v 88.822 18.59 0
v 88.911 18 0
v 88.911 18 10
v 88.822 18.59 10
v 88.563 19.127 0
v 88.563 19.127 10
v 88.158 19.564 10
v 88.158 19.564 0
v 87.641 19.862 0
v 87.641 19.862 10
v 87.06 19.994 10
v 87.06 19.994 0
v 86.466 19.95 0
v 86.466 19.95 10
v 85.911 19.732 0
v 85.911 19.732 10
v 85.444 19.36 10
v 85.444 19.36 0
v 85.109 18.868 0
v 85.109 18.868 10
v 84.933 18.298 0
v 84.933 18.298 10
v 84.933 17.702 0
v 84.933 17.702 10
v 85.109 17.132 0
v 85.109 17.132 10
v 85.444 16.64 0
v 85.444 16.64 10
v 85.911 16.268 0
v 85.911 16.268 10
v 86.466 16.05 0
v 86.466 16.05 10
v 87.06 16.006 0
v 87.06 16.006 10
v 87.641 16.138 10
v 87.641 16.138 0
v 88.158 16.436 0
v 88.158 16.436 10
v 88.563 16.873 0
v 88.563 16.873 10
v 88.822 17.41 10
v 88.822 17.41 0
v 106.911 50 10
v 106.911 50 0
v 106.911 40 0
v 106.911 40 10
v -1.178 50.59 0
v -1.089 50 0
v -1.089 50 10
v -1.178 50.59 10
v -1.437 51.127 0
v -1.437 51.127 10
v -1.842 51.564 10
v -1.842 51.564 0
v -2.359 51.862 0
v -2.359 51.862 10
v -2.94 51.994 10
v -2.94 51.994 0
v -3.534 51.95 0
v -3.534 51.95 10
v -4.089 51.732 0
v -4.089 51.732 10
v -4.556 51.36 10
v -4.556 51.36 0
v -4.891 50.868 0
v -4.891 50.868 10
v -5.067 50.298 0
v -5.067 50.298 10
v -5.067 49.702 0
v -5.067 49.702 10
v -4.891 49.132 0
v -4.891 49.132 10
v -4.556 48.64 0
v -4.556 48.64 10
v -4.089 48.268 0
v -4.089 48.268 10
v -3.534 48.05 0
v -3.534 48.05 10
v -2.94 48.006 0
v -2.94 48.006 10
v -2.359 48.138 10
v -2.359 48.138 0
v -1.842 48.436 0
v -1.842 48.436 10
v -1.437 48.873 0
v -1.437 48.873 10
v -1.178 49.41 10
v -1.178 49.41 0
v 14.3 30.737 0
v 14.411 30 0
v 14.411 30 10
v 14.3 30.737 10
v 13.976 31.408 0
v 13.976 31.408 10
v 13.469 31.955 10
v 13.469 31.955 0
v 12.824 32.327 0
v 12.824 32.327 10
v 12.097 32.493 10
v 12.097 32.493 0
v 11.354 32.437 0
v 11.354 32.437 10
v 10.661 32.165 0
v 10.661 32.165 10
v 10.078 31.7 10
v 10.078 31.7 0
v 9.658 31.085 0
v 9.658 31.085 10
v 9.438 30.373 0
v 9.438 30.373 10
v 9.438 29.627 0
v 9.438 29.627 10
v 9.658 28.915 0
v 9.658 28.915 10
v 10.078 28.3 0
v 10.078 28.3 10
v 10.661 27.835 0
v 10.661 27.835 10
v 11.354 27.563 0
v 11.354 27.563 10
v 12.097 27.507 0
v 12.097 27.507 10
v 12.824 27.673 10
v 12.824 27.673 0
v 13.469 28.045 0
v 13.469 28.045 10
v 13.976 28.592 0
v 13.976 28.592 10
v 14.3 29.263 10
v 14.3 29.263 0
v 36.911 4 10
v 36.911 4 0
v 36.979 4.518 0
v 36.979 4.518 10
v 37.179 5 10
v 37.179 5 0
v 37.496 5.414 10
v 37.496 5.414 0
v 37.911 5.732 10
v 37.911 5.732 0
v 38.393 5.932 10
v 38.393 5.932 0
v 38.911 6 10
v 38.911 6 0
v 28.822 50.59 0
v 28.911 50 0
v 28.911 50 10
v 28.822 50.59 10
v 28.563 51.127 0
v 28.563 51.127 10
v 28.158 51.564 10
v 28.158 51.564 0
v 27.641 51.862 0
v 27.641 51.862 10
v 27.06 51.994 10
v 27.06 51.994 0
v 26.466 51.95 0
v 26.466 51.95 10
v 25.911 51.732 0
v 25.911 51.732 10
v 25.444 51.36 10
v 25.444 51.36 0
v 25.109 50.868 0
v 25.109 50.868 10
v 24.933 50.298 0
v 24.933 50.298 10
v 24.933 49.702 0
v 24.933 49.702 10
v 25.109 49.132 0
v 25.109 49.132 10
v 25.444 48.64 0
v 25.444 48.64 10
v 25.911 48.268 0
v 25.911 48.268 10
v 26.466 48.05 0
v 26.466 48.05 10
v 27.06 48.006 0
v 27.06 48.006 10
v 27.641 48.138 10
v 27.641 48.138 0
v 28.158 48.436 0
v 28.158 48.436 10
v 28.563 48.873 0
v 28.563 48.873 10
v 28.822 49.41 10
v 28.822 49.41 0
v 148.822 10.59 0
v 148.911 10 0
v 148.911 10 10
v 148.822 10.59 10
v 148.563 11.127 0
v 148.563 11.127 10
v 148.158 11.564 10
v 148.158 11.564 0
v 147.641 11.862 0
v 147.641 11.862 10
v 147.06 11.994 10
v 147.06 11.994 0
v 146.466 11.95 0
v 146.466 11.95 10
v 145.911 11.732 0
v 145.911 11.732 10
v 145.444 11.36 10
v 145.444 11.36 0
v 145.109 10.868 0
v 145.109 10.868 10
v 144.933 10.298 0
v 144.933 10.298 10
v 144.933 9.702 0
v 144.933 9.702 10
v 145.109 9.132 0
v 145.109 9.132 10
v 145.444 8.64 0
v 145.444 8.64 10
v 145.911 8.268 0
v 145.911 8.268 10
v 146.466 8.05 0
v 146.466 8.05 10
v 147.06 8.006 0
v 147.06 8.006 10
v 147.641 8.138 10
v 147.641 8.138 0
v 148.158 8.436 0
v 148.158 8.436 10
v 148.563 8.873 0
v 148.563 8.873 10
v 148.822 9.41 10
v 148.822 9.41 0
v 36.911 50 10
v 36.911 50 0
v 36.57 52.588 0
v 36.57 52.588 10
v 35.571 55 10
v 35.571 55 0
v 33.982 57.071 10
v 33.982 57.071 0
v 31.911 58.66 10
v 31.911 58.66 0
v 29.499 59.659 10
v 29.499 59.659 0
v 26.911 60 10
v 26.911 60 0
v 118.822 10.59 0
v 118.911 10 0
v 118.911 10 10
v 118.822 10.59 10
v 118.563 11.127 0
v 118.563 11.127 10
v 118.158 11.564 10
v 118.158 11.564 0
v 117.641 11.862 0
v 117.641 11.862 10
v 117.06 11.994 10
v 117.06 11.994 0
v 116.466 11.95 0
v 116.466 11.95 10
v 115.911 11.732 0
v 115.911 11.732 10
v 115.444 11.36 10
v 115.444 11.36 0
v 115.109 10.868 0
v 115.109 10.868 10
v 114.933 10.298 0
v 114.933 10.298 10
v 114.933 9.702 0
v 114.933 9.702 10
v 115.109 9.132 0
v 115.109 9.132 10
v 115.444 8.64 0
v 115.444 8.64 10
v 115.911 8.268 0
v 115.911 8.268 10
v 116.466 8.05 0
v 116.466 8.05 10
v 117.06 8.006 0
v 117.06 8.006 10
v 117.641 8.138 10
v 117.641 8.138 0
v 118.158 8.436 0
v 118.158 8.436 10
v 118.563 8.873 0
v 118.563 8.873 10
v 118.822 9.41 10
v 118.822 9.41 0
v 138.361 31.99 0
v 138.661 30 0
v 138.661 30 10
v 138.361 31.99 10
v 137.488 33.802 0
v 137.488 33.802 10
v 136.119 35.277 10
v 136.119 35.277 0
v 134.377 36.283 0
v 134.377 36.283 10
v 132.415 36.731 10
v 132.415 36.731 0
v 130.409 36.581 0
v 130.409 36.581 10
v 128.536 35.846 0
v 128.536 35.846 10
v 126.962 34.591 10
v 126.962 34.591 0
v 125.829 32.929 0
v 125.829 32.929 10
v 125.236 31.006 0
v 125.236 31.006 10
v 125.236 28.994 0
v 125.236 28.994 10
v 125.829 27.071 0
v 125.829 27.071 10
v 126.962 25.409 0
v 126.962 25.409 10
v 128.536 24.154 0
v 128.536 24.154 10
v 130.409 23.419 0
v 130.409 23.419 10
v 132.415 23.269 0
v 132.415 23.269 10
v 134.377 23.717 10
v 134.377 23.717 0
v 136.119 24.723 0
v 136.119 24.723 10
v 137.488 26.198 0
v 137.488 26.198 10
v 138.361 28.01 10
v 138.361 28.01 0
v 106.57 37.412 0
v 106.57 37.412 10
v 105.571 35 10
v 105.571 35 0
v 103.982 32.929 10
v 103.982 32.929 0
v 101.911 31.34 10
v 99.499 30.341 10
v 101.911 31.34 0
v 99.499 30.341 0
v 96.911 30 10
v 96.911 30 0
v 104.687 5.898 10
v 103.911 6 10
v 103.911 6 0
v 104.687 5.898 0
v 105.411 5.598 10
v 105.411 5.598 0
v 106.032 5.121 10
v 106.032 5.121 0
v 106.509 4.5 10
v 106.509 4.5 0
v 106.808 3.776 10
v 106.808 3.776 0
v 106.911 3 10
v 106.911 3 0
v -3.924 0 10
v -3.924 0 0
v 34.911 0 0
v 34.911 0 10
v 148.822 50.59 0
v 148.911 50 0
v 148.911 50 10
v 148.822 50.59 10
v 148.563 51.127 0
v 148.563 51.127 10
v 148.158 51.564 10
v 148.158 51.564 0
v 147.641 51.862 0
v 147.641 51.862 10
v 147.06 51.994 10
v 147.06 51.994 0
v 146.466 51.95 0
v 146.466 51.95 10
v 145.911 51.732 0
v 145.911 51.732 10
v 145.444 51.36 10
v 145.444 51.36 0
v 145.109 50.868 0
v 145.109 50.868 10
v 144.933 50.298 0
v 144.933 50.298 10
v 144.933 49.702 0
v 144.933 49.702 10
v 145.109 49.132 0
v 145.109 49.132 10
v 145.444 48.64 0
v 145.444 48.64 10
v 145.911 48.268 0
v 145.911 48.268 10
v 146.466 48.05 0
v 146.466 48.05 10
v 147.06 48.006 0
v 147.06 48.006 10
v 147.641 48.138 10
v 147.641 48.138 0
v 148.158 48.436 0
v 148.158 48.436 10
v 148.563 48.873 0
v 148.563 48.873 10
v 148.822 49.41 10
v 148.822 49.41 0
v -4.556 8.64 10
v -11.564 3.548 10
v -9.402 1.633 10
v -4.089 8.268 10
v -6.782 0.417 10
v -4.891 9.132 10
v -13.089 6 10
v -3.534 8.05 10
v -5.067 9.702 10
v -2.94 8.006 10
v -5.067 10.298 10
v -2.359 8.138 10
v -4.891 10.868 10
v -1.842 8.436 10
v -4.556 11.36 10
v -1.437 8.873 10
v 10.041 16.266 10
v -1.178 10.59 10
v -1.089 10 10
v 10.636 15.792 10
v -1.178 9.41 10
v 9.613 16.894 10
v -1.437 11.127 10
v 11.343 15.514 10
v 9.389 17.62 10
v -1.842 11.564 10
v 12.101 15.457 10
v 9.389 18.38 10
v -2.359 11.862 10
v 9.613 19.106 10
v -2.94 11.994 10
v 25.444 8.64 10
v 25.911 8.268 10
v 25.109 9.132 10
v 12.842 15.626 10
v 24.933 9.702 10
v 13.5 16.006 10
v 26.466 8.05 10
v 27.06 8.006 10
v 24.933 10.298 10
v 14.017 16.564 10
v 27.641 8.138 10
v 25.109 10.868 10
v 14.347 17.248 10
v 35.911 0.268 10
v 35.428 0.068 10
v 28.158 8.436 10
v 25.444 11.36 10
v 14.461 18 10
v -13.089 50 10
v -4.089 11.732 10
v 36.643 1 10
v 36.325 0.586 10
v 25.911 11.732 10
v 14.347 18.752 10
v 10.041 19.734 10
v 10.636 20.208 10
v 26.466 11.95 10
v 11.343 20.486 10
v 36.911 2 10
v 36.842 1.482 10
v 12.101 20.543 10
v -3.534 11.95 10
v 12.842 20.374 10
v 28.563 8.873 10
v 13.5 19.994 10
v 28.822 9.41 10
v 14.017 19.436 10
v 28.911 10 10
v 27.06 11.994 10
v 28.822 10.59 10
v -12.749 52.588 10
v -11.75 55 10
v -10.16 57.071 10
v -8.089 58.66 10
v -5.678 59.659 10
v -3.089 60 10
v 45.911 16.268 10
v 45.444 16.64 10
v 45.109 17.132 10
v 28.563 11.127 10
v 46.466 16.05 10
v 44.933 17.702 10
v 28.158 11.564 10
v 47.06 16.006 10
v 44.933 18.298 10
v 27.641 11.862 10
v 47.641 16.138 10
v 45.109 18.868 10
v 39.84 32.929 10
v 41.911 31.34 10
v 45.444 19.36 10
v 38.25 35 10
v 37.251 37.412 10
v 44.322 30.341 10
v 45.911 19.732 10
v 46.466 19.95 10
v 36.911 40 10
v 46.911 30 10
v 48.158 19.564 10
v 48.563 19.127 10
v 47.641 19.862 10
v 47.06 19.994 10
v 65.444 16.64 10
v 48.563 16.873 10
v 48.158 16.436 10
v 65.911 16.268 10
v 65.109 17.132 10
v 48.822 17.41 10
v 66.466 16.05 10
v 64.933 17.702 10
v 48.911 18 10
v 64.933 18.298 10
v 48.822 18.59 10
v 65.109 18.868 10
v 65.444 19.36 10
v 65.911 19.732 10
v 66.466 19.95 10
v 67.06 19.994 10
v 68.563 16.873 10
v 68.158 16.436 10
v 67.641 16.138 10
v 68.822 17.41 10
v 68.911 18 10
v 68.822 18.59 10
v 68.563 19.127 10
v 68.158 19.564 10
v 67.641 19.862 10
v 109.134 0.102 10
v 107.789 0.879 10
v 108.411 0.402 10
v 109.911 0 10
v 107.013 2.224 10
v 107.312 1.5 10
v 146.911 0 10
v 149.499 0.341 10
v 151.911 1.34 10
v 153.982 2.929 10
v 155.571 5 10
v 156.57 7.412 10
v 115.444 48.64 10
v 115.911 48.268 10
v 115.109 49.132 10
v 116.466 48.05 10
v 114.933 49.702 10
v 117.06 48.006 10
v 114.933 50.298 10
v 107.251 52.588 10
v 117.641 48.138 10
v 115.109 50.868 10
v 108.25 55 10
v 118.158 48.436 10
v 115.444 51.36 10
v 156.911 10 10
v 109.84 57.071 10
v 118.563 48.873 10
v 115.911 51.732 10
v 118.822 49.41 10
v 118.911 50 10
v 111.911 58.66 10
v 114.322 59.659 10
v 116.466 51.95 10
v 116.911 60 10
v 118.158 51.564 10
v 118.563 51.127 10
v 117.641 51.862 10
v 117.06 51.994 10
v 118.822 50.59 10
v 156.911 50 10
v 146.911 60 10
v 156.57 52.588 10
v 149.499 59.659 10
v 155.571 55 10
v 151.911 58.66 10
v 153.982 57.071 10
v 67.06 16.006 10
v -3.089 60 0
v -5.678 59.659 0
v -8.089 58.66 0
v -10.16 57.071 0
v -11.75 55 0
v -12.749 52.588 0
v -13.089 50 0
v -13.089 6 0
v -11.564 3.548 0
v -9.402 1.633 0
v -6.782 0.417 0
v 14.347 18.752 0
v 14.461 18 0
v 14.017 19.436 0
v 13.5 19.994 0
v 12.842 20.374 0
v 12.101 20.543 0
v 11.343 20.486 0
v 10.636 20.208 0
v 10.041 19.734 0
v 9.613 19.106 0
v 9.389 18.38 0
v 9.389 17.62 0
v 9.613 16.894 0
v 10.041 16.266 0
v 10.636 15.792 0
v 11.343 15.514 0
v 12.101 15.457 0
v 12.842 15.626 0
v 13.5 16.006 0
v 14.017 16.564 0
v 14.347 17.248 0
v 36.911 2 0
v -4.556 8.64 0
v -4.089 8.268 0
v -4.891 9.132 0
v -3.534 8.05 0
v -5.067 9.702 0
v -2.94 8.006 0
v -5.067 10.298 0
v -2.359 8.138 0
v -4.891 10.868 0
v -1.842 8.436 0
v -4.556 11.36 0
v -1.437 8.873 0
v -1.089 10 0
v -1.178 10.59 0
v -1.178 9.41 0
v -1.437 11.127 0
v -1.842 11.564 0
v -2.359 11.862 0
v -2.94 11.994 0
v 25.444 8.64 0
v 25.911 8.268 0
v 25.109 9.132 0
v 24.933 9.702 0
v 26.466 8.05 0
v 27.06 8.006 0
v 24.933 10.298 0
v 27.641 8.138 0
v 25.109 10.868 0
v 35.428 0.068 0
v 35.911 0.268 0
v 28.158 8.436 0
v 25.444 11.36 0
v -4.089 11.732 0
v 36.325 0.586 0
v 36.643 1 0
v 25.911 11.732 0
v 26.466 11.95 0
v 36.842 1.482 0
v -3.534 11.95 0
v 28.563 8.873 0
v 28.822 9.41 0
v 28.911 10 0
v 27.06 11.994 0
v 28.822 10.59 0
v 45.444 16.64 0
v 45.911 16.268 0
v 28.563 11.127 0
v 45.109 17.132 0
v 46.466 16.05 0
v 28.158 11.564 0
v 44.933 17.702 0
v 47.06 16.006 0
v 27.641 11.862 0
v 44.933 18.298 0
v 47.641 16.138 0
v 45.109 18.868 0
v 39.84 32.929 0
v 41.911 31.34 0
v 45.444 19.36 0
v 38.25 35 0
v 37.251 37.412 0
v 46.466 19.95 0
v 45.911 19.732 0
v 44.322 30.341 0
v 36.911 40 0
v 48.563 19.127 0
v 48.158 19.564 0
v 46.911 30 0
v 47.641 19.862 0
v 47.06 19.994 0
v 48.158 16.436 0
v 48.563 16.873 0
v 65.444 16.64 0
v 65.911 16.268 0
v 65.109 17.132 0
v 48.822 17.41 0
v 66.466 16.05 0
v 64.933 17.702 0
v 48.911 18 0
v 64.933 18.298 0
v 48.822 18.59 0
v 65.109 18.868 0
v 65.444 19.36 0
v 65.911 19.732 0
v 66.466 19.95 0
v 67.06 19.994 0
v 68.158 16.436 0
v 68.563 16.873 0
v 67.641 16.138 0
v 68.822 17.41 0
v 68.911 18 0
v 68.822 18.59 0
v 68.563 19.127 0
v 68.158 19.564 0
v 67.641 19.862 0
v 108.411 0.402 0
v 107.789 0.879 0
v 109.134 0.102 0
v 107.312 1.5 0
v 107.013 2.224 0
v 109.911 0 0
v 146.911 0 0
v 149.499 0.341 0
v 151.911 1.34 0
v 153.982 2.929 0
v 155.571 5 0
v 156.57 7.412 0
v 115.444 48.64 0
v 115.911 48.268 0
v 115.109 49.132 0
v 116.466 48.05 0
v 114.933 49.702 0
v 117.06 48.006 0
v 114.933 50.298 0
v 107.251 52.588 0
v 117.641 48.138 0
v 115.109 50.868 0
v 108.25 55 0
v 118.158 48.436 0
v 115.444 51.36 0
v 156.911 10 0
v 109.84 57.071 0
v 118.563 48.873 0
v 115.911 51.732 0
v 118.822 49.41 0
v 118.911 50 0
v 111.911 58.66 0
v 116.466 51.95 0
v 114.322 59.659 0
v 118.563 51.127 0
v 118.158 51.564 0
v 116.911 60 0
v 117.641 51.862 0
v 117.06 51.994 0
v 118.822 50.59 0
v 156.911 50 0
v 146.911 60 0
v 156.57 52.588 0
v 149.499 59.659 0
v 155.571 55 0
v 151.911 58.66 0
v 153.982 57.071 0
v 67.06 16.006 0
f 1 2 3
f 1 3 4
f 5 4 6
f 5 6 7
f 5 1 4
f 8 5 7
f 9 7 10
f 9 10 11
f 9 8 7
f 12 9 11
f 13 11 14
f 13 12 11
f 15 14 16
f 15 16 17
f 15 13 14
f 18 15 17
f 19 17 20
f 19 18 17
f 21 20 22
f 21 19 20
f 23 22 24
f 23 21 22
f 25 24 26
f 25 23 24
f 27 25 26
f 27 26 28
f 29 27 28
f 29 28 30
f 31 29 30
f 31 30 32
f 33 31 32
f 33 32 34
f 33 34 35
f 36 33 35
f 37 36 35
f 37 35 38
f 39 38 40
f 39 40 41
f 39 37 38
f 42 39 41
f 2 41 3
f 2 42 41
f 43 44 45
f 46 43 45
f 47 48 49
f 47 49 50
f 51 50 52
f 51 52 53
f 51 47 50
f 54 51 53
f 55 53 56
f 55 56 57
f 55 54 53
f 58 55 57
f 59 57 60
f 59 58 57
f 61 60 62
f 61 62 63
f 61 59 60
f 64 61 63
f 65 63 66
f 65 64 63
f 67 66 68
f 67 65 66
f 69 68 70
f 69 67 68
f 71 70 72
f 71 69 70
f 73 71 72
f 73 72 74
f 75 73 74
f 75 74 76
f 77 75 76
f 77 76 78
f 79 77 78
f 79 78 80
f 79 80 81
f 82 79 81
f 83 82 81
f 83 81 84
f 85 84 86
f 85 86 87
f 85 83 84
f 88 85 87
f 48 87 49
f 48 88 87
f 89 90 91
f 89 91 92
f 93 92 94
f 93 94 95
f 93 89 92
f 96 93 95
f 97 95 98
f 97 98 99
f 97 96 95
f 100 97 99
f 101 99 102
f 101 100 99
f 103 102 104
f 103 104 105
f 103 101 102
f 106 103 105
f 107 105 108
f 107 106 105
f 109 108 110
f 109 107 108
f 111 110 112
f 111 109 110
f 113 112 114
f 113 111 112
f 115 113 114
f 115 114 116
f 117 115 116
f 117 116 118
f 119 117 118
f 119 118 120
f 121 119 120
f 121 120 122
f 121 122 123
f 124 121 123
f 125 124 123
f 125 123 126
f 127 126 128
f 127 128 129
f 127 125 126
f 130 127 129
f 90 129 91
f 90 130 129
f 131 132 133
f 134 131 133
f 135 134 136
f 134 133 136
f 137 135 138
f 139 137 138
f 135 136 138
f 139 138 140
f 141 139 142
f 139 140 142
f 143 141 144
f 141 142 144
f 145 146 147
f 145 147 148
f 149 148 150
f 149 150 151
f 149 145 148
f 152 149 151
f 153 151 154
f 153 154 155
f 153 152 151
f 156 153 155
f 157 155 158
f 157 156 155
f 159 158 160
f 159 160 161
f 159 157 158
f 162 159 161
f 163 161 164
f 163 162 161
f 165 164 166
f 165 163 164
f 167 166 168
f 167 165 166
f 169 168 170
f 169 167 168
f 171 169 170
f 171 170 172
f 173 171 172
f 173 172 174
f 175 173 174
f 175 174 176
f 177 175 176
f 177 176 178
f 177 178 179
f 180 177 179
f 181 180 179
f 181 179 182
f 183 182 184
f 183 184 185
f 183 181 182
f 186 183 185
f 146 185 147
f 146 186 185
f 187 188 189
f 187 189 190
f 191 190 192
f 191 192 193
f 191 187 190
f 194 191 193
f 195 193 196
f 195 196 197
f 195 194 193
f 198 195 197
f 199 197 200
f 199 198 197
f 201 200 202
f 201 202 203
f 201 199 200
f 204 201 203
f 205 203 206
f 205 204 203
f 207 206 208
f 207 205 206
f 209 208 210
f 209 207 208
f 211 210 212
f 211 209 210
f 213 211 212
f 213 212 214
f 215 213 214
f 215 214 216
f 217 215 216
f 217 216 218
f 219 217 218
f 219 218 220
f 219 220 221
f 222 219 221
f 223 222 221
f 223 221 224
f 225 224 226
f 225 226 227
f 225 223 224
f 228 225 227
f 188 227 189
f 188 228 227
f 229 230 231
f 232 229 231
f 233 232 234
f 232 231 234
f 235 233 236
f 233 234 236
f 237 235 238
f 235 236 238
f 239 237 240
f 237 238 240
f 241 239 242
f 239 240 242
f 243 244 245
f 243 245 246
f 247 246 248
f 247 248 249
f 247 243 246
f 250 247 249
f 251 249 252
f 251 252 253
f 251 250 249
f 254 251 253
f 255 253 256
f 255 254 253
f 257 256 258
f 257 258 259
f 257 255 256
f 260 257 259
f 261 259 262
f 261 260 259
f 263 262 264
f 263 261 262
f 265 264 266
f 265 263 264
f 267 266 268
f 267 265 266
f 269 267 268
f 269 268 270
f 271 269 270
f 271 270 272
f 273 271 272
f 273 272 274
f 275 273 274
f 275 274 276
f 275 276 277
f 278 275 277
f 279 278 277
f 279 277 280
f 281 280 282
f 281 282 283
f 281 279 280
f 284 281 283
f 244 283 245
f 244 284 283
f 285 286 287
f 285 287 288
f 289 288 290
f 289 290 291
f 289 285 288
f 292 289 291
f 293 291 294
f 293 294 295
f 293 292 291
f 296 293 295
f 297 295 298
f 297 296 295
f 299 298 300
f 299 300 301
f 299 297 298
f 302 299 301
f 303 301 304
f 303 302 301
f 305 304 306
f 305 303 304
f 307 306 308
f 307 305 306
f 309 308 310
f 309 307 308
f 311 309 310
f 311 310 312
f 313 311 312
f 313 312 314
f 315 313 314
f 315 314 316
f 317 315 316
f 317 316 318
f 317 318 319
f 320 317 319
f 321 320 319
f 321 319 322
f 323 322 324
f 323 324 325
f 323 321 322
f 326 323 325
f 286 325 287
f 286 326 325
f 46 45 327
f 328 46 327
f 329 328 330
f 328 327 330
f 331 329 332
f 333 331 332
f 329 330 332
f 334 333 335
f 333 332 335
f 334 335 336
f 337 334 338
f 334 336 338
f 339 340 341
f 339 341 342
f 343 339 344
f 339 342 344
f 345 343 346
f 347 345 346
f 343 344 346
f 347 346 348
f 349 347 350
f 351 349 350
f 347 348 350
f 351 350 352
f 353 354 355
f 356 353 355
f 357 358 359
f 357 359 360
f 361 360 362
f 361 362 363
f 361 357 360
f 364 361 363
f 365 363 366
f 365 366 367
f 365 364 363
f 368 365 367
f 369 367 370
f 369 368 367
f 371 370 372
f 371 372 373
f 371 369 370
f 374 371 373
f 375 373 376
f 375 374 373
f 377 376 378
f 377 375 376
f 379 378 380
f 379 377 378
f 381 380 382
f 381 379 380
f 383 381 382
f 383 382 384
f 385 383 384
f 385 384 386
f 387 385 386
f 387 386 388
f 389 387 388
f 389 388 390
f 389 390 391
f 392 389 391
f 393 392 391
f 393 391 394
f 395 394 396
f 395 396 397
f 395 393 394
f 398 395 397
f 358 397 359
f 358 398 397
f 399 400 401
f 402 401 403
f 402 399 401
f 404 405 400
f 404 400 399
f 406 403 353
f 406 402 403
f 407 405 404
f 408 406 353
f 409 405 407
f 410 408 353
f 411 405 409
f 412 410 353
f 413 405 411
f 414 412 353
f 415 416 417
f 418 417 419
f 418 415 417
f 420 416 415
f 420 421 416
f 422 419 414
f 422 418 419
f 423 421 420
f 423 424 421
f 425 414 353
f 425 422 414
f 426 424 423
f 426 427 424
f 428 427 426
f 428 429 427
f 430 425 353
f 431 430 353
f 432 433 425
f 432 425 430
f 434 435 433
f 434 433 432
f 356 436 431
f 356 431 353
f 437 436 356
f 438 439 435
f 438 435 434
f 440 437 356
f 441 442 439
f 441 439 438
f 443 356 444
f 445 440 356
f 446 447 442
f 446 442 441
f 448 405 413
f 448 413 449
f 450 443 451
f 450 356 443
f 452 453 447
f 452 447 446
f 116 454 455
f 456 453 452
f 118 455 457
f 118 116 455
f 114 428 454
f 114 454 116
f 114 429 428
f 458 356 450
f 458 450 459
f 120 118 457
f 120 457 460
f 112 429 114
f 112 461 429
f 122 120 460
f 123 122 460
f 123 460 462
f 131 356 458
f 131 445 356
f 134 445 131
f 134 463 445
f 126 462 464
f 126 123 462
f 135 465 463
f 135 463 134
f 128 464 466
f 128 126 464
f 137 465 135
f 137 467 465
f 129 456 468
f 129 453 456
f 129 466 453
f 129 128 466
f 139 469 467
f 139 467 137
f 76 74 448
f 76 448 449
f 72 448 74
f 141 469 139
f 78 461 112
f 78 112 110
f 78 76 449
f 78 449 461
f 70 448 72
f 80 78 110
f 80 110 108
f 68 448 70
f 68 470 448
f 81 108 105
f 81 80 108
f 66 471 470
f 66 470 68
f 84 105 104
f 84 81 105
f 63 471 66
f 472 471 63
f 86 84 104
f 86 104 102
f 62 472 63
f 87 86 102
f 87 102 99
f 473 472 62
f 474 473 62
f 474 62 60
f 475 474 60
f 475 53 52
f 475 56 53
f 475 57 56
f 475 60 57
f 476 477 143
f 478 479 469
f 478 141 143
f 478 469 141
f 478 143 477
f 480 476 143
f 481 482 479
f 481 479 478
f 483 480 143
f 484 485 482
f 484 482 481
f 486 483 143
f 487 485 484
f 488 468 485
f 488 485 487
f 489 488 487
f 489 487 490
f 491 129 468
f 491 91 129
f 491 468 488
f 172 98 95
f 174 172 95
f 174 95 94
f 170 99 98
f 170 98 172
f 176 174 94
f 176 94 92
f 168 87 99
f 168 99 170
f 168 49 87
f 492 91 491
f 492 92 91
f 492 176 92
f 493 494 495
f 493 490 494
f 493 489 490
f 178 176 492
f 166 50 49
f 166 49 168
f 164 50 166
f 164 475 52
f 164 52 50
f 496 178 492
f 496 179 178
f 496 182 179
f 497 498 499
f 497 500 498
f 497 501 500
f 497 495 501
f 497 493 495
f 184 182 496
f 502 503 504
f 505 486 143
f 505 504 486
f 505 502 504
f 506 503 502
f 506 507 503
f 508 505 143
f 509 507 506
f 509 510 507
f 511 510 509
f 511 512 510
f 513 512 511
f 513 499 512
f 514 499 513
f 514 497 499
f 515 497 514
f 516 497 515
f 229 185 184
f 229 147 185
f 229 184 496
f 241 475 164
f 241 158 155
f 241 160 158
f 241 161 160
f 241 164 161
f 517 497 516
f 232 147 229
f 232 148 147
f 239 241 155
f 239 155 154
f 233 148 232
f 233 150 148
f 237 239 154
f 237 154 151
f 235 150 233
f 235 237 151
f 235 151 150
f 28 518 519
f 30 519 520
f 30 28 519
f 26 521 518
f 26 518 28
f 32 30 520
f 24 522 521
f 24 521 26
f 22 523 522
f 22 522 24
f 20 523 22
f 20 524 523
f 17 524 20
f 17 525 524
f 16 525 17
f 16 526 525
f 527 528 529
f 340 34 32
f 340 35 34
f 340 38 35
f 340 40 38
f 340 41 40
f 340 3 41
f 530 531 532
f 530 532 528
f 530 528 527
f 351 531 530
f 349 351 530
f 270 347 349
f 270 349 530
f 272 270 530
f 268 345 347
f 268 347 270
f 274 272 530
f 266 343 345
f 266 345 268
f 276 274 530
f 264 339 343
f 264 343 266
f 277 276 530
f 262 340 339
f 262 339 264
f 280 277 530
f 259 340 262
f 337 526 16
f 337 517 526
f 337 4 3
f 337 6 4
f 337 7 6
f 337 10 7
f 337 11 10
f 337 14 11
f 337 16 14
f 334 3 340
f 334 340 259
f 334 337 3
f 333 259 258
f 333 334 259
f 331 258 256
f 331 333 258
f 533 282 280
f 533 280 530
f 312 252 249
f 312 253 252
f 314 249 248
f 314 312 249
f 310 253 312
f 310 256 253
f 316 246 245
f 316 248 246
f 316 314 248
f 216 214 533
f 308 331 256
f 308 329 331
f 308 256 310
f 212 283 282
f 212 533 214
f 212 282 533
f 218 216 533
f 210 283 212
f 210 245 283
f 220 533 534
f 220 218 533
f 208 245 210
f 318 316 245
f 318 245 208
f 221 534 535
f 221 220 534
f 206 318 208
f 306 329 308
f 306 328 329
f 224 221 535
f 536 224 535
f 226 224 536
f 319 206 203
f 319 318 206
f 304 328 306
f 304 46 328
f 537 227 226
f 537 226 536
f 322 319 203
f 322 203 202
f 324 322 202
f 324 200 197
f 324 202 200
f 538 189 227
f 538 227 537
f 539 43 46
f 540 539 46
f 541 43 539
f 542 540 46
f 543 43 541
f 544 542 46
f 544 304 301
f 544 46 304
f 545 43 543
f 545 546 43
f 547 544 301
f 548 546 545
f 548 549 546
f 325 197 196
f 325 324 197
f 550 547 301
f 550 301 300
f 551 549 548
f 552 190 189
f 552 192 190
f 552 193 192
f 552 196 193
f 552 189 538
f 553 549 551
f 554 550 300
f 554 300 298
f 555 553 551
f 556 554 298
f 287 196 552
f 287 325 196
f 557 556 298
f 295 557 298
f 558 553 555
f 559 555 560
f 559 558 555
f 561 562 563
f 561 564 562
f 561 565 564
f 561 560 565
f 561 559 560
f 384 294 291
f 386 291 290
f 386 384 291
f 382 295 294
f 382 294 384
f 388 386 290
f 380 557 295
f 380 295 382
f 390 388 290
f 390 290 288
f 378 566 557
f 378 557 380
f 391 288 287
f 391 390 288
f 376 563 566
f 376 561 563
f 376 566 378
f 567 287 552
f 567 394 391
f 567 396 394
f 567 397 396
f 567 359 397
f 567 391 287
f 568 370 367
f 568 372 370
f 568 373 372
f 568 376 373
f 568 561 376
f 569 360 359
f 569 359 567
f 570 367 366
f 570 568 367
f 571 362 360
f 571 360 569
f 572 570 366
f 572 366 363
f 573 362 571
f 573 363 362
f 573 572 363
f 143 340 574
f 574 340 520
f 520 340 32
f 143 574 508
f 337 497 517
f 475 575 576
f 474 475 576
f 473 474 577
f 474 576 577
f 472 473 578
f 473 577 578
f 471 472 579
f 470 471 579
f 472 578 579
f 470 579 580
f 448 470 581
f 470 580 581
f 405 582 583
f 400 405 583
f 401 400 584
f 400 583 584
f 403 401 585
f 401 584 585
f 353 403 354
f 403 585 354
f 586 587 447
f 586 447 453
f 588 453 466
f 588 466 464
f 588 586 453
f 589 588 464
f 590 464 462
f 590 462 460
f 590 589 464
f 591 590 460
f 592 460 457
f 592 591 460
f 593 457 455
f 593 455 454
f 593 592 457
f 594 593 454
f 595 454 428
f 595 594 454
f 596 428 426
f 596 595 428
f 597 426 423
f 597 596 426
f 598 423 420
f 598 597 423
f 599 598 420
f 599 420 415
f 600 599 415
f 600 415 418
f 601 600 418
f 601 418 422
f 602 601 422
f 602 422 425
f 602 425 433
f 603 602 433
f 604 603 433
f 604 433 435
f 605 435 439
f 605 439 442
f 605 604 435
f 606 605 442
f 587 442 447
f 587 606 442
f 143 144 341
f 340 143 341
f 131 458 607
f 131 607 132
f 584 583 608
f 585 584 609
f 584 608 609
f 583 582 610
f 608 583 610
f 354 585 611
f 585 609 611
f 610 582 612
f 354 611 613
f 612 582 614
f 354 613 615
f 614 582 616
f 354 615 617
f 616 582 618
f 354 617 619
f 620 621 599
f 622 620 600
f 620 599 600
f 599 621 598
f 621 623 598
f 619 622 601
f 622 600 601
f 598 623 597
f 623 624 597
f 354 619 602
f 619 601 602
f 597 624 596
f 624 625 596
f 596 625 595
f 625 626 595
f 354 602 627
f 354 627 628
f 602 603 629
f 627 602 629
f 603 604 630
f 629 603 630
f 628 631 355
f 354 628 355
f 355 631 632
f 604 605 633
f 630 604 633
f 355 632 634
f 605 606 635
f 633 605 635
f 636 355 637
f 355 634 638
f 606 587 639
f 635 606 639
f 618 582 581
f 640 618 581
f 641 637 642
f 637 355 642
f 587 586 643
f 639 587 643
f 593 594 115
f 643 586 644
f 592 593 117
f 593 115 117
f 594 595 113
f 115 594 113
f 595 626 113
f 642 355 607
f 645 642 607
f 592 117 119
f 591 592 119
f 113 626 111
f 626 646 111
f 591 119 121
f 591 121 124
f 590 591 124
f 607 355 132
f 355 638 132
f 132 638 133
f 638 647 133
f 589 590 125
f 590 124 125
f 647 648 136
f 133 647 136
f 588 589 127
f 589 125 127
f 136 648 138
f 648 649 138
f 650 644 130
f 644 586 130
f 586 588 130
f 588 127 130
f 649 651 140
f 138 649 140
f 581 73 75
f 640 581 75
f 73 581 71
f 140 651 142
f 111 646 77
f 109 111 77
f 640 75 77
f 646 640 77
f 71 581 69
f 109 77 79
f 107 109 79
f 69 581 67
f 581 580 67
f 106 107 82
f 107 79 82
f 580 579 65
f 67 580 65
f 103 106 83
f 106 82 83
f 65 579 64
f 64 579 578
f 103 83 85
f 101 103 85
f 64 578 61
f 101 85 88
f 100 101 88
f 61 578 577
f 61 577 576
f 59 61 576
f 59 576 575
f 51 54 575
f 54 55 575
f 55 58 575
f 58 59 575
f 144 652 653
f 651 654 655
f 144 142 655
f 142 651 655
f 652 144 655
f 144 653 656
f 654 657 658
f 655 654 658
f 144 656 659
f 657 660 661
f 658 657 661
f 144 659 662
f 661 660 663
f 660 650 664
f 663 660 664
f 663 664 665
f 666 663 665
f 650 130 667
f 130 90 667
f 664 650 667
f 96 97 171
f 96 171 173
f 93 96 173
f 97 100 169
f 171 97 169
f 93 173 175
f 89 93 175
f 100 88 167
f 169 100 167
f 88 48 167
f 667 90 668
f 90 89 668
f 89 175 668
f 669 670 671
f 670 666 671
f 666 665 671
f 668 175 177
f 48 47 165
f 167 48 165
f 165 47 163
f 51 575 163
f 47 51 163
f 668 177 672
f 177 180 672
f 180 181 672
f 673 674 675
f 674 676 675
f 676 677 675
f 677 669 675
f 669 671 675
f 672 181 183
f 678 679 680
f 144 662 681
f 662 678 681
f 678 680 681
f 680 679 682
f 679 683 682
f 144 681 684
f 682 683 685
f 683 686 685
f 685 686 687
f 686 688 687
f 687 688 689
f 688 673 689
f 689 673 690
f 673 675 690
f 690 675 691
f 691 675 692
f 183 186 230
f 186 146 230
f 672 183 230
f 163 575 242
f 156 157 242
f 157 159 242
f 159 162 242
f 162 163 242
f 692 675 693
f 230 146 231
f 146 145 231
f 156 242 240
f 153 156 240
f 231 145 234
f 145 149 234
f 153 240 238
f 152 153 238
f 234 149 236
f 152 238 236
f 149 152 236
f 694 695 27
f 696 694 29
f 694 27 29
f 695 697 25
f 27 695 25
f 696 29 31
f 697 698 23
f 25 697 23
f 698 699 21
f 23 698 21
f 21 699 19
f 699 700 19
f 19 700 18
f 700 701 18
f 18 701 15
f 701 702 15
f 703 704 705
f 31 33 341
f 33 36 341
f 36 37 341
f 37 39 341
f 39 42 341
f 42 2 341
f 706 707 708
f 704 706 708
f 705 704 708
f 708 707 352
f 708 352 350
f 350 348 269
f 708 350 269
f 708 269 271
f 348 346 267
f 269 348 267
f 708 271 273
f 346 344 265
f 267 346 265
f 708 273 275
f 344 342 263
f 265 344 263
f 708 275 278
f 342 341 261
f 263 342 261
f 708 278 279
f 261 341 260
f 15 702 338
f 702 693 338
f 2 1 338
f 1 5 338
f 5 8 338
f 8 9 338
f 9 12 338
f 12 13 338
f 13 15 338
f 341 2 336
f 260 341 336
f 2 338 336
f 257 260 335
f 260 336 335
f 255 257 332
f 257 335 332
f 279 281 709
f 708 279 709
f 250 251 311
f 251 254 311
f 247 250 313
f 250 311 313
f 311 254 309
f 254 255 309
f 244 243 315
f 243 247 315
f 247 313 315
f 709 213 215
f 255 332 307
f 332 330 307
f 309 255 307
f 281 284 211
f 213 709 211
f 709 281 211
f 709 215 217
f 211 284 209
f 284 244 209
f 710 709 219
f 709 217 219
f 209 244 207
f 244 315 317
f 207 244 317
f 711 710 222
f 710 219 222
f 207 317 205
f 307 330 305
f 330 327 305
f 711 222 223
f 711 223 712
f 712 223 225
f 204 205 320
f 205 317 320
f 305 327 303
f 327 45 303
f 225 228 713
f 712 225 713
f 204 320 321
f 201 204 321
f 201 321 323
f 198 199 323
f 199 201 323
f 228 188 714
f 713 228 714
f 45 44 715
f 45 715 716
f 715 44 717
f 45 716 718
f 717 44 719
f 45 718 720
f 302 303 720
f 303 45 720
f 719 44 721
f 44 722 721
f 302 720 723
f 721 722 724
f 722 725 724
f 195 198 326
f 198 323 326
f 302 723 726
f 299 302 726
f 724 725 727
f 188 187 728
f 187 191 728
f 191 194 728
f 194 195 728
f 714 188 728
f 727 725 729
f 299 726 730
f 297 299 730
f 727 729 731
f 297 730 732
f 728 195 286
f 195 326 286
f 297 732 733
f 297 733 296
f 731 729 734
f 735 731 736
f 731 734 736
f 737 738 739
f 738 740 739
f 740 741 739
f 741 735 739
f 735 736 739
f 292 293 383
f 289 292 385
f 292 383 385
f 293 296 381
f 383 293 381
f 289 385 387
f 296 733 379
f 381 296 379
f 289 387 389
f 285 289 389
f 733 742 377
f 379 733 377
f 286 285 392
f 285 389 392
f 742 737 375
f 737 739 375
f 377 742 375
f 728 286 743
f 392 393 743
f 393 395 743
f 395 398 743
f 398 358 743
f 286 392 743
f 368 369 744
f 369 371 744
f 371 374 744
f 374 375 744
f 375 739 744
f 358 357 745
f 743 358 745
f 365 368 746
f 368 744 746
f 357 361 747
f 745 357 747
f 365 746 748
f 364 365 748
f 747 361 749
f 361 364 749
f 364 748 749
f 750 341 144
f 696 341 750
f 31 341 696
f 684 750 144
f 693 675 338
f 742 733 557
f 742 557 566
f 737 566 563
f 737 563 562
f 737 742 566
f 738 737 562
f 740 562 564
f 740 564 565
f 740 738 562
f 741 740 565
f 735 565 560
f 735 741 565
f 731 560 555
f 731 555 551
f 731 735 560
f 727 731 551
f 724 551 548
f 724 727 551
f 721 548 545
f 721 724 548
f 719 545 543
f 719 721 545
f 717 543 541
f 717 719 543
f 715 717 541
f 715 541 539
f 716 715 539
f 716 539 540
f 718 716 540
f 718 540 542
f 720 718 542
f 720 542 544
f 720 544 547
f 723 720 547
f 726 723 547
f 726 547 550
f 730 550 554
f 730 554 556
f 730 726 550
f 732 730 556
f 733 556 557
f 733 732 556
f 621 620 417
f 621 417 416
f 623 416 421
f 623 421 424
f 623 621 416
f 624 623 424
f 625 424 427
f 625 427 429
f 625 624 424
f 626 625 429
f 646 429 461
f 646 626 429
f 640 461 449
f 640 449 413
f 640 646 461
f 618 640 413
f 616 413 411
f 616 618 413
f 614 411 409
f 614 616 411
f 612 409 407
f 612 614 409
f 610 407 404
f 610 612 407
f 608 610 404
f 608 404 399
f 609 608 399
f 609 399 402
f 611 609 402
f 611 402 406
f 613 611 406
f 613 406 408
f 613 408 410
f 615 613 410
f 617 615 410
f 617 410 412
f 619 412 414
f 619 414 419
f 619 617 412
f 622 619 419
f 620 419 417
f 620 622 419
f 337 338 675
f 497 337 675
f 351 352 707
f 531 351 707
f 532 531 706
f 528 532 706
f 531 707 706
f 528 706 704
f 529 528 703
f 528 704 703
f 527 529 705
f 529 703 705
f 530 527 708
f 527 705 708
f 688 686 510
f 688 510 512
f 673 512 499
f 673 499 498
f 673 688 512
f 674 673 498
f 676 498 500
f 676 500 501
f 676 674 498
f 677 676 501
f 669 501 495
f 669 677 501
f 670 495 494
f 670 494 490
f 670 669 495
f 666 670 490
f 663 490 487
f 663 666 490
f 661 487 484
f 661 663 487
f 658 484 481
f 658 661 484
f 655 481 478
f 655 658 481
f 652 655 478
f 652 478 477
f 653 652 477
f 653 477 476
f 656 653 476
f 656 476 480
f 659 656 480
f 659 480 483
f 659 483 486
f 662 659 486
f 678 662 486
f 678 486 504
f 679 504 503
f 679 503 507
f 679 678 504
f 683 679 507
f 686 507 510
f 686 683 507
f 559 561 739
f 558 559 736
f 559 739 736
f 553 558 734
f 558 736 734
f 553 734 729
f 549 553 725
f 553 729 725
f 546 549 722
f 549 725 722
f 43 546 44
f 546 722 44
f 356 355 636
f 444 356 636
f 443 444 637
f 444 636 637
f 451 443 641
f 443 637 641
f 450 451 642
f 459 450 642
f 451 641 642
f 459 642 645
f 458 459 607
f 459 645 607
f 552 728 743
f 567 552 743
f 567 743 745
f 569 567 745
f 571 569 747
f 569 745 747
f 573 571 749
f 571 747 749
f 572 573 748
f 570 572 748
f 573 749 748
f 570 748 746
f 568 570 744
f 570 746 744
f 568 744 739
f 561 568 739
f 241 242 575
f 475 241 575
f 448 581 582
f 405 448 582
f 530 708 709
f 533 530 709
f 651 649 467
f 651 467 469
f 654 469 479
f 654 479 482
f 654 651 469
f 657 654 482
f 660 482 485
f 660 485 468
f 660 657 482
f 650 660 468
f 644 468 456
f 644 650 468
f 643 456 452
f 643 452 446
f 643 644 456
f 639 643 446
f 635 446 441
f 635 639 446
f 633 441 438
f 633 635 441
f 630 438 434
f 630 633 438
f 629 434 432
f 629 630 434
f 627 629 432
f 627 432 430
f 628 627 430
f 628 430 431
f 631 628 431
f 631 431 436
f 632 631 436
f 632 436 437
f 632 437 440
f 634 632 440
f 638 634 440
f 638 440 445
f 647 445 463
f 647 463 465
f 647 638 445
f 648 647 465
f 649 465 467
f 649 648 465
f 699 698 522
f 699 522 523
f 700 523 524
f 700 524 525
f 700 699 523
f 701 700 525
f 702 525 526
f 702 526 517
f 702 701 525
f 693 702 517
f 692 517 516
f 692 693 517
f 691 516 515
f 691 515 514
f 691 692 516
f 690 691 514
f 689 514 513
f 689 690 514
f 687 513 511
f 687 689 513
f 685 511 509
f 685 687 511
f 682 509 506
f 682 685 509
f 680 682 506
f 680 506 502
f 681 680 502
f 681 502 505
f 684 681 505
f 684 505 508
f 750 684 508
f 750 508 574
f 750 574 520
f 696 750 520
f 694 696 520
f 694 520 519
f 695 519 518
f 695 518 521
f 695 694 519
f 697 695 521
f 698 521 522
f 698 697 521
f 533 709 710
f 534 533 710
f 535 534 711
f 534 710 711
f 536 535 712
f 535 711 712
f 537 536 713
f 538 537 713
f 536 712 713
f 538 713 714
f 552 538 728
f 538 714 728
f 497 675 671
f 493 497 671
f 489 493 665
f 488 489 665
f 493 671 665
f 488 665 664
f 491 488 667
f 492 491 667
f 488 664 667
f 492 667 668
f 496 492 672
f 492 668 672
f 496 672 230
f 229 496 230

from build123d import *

# Parameters (mm, degrees)
MODEL_R             = 2
MODEL_R_2           = 2.5
MODEL_R_3           = 6.75
MODEL_R_4           = 2.55
BOSS_EXTRUDE1_DEPTH = 10


with BuildPart() as part:
    # Model → Boss-Extrude1 (new body)
    with BuildSketch(Plane.XY):
        with BuildLine():
            Line((-13.089430894, 50), (-13.089430894, 6))
            ThreePointArc((-13.089430894, 6), (-9.401505079, 1.633399735), (-3.924279504, 0))
            Line((-3.924279504, 0), (34.910569106, 0))
            ThreePointArc((34.910569106, 0), (36.324782668, 0.585786438), (36.910569106, 2))
            Line((36.910569106, 2), (36.910569106, 4))
            ThreePointArc((36.910569106, 4), (37.496355543, 5.414213562), (38.910569106, 6))
            Line((38.910569106, 6), (103.910569106, 6))
            ThreePointArc((103.910569106, 6), (106.031889449, 5.121320344), (106.910569106, 3))
            ThreePointArc((106.910569106, 3), (107.789248762, 0.878679656), (109.910569106, 0))
            Line((109.910569106, 0), (146.910569106, 0))
            ThreePointArc((146.910569106, 0), (153.981636918, 2.928932188), (156.910569106, 10))
            Line((156.910569106, 10), (156.910569106, 50))
            ThreePointArc((156.910569106, 50), (153.981636918, 57.071067812), (146.910569106, 60))
            Line((146.910569106, 60), (116.910569106, 60))
            ThreePointArc((116.910569106, 60), (109.839501294, 57.071067812), (106.910569106, 50))
            Line((106.910569106, 50), (106.910569106, 40))
            ThreePointArc((106.910569106, 40), (103.981636918, 32.928932188), (96.910569106, 30))
            Line((96.910569106, 30), (46.910569106, 30))
            ThreePointArc((46.910569106, 30), (39.839501294, 32.928932188), (36.910569106, 40))
            Line((36.910569106, 40), (36.910569106, 50))
            ThreePointArc((36.910569106, 50), (33.981636918, 57.071067812), (26.910569106, 60))
            Line((26.910569106, 60), (-3.089430894, 60))
            ThreePointArc((-3.089430894, 60), (-10.160498706, 57.071067812), (-13.089430894, 50))
        make_face()
        with Locations((26.910569106, 50)):
            Circle(MODEL_R, mode=Mode.SUBTRACT)
        with Locations((26.910569106, 10)):
            Circle(MODEL_R, mode=Mode.SUBTRACT)
        with Locations((11.910569106, 30)):
            Circle(MODEL_R_2, mode=Mode.SUBTRACT)
        with Locations((131.910569106, 30)):
            Circle(MODEL_R_3, mode=Mode.SUBTRACT)
        with Locations((146.910569106, 50)):
            Circle(MODEL_R, mode=Mode.SUBTRACT)
        with Locations((86.910569106, 18)):
            Circle(MODEL_R, mode=Mode.SUBTRACT)
        with Locations((146.910569106, 10)):
            Circle(MODEL_R, mode=Mode.SUBTRACT)
        with Locations((116.910569106, 10)):
            Circle(MODEL_R, mode=Mode.SUBTRACT)
        with Locations((46.910569106, 18)):
            Circle(MODEL_R, mode=Mode.SUBTRACT)
        with Locations((66.910569106, 18)):
            Circle(MODEL_R, mode=Mode.SUBTRACT)
        with Locations((116.910569106, 50)):
            Circle(MODEL_R, mode=Mode.SUBTRACT)
        with Locations((11.910569106, 18)):
            Circle(MODEL_R_4, mode=Mode.SUBTRACT)
        with Locations((-3.089430894, 10)):
            Circle(MODEL_R, mode=Mode.SUBTRACT)
        with Locations((-3.089430894, 50)):
            Circle(MODEL_R, mode=Mode.SUBTRACT)
    extrude(amount=BOSS_EXTRUDE1_DEPTH)


solid = part.part
